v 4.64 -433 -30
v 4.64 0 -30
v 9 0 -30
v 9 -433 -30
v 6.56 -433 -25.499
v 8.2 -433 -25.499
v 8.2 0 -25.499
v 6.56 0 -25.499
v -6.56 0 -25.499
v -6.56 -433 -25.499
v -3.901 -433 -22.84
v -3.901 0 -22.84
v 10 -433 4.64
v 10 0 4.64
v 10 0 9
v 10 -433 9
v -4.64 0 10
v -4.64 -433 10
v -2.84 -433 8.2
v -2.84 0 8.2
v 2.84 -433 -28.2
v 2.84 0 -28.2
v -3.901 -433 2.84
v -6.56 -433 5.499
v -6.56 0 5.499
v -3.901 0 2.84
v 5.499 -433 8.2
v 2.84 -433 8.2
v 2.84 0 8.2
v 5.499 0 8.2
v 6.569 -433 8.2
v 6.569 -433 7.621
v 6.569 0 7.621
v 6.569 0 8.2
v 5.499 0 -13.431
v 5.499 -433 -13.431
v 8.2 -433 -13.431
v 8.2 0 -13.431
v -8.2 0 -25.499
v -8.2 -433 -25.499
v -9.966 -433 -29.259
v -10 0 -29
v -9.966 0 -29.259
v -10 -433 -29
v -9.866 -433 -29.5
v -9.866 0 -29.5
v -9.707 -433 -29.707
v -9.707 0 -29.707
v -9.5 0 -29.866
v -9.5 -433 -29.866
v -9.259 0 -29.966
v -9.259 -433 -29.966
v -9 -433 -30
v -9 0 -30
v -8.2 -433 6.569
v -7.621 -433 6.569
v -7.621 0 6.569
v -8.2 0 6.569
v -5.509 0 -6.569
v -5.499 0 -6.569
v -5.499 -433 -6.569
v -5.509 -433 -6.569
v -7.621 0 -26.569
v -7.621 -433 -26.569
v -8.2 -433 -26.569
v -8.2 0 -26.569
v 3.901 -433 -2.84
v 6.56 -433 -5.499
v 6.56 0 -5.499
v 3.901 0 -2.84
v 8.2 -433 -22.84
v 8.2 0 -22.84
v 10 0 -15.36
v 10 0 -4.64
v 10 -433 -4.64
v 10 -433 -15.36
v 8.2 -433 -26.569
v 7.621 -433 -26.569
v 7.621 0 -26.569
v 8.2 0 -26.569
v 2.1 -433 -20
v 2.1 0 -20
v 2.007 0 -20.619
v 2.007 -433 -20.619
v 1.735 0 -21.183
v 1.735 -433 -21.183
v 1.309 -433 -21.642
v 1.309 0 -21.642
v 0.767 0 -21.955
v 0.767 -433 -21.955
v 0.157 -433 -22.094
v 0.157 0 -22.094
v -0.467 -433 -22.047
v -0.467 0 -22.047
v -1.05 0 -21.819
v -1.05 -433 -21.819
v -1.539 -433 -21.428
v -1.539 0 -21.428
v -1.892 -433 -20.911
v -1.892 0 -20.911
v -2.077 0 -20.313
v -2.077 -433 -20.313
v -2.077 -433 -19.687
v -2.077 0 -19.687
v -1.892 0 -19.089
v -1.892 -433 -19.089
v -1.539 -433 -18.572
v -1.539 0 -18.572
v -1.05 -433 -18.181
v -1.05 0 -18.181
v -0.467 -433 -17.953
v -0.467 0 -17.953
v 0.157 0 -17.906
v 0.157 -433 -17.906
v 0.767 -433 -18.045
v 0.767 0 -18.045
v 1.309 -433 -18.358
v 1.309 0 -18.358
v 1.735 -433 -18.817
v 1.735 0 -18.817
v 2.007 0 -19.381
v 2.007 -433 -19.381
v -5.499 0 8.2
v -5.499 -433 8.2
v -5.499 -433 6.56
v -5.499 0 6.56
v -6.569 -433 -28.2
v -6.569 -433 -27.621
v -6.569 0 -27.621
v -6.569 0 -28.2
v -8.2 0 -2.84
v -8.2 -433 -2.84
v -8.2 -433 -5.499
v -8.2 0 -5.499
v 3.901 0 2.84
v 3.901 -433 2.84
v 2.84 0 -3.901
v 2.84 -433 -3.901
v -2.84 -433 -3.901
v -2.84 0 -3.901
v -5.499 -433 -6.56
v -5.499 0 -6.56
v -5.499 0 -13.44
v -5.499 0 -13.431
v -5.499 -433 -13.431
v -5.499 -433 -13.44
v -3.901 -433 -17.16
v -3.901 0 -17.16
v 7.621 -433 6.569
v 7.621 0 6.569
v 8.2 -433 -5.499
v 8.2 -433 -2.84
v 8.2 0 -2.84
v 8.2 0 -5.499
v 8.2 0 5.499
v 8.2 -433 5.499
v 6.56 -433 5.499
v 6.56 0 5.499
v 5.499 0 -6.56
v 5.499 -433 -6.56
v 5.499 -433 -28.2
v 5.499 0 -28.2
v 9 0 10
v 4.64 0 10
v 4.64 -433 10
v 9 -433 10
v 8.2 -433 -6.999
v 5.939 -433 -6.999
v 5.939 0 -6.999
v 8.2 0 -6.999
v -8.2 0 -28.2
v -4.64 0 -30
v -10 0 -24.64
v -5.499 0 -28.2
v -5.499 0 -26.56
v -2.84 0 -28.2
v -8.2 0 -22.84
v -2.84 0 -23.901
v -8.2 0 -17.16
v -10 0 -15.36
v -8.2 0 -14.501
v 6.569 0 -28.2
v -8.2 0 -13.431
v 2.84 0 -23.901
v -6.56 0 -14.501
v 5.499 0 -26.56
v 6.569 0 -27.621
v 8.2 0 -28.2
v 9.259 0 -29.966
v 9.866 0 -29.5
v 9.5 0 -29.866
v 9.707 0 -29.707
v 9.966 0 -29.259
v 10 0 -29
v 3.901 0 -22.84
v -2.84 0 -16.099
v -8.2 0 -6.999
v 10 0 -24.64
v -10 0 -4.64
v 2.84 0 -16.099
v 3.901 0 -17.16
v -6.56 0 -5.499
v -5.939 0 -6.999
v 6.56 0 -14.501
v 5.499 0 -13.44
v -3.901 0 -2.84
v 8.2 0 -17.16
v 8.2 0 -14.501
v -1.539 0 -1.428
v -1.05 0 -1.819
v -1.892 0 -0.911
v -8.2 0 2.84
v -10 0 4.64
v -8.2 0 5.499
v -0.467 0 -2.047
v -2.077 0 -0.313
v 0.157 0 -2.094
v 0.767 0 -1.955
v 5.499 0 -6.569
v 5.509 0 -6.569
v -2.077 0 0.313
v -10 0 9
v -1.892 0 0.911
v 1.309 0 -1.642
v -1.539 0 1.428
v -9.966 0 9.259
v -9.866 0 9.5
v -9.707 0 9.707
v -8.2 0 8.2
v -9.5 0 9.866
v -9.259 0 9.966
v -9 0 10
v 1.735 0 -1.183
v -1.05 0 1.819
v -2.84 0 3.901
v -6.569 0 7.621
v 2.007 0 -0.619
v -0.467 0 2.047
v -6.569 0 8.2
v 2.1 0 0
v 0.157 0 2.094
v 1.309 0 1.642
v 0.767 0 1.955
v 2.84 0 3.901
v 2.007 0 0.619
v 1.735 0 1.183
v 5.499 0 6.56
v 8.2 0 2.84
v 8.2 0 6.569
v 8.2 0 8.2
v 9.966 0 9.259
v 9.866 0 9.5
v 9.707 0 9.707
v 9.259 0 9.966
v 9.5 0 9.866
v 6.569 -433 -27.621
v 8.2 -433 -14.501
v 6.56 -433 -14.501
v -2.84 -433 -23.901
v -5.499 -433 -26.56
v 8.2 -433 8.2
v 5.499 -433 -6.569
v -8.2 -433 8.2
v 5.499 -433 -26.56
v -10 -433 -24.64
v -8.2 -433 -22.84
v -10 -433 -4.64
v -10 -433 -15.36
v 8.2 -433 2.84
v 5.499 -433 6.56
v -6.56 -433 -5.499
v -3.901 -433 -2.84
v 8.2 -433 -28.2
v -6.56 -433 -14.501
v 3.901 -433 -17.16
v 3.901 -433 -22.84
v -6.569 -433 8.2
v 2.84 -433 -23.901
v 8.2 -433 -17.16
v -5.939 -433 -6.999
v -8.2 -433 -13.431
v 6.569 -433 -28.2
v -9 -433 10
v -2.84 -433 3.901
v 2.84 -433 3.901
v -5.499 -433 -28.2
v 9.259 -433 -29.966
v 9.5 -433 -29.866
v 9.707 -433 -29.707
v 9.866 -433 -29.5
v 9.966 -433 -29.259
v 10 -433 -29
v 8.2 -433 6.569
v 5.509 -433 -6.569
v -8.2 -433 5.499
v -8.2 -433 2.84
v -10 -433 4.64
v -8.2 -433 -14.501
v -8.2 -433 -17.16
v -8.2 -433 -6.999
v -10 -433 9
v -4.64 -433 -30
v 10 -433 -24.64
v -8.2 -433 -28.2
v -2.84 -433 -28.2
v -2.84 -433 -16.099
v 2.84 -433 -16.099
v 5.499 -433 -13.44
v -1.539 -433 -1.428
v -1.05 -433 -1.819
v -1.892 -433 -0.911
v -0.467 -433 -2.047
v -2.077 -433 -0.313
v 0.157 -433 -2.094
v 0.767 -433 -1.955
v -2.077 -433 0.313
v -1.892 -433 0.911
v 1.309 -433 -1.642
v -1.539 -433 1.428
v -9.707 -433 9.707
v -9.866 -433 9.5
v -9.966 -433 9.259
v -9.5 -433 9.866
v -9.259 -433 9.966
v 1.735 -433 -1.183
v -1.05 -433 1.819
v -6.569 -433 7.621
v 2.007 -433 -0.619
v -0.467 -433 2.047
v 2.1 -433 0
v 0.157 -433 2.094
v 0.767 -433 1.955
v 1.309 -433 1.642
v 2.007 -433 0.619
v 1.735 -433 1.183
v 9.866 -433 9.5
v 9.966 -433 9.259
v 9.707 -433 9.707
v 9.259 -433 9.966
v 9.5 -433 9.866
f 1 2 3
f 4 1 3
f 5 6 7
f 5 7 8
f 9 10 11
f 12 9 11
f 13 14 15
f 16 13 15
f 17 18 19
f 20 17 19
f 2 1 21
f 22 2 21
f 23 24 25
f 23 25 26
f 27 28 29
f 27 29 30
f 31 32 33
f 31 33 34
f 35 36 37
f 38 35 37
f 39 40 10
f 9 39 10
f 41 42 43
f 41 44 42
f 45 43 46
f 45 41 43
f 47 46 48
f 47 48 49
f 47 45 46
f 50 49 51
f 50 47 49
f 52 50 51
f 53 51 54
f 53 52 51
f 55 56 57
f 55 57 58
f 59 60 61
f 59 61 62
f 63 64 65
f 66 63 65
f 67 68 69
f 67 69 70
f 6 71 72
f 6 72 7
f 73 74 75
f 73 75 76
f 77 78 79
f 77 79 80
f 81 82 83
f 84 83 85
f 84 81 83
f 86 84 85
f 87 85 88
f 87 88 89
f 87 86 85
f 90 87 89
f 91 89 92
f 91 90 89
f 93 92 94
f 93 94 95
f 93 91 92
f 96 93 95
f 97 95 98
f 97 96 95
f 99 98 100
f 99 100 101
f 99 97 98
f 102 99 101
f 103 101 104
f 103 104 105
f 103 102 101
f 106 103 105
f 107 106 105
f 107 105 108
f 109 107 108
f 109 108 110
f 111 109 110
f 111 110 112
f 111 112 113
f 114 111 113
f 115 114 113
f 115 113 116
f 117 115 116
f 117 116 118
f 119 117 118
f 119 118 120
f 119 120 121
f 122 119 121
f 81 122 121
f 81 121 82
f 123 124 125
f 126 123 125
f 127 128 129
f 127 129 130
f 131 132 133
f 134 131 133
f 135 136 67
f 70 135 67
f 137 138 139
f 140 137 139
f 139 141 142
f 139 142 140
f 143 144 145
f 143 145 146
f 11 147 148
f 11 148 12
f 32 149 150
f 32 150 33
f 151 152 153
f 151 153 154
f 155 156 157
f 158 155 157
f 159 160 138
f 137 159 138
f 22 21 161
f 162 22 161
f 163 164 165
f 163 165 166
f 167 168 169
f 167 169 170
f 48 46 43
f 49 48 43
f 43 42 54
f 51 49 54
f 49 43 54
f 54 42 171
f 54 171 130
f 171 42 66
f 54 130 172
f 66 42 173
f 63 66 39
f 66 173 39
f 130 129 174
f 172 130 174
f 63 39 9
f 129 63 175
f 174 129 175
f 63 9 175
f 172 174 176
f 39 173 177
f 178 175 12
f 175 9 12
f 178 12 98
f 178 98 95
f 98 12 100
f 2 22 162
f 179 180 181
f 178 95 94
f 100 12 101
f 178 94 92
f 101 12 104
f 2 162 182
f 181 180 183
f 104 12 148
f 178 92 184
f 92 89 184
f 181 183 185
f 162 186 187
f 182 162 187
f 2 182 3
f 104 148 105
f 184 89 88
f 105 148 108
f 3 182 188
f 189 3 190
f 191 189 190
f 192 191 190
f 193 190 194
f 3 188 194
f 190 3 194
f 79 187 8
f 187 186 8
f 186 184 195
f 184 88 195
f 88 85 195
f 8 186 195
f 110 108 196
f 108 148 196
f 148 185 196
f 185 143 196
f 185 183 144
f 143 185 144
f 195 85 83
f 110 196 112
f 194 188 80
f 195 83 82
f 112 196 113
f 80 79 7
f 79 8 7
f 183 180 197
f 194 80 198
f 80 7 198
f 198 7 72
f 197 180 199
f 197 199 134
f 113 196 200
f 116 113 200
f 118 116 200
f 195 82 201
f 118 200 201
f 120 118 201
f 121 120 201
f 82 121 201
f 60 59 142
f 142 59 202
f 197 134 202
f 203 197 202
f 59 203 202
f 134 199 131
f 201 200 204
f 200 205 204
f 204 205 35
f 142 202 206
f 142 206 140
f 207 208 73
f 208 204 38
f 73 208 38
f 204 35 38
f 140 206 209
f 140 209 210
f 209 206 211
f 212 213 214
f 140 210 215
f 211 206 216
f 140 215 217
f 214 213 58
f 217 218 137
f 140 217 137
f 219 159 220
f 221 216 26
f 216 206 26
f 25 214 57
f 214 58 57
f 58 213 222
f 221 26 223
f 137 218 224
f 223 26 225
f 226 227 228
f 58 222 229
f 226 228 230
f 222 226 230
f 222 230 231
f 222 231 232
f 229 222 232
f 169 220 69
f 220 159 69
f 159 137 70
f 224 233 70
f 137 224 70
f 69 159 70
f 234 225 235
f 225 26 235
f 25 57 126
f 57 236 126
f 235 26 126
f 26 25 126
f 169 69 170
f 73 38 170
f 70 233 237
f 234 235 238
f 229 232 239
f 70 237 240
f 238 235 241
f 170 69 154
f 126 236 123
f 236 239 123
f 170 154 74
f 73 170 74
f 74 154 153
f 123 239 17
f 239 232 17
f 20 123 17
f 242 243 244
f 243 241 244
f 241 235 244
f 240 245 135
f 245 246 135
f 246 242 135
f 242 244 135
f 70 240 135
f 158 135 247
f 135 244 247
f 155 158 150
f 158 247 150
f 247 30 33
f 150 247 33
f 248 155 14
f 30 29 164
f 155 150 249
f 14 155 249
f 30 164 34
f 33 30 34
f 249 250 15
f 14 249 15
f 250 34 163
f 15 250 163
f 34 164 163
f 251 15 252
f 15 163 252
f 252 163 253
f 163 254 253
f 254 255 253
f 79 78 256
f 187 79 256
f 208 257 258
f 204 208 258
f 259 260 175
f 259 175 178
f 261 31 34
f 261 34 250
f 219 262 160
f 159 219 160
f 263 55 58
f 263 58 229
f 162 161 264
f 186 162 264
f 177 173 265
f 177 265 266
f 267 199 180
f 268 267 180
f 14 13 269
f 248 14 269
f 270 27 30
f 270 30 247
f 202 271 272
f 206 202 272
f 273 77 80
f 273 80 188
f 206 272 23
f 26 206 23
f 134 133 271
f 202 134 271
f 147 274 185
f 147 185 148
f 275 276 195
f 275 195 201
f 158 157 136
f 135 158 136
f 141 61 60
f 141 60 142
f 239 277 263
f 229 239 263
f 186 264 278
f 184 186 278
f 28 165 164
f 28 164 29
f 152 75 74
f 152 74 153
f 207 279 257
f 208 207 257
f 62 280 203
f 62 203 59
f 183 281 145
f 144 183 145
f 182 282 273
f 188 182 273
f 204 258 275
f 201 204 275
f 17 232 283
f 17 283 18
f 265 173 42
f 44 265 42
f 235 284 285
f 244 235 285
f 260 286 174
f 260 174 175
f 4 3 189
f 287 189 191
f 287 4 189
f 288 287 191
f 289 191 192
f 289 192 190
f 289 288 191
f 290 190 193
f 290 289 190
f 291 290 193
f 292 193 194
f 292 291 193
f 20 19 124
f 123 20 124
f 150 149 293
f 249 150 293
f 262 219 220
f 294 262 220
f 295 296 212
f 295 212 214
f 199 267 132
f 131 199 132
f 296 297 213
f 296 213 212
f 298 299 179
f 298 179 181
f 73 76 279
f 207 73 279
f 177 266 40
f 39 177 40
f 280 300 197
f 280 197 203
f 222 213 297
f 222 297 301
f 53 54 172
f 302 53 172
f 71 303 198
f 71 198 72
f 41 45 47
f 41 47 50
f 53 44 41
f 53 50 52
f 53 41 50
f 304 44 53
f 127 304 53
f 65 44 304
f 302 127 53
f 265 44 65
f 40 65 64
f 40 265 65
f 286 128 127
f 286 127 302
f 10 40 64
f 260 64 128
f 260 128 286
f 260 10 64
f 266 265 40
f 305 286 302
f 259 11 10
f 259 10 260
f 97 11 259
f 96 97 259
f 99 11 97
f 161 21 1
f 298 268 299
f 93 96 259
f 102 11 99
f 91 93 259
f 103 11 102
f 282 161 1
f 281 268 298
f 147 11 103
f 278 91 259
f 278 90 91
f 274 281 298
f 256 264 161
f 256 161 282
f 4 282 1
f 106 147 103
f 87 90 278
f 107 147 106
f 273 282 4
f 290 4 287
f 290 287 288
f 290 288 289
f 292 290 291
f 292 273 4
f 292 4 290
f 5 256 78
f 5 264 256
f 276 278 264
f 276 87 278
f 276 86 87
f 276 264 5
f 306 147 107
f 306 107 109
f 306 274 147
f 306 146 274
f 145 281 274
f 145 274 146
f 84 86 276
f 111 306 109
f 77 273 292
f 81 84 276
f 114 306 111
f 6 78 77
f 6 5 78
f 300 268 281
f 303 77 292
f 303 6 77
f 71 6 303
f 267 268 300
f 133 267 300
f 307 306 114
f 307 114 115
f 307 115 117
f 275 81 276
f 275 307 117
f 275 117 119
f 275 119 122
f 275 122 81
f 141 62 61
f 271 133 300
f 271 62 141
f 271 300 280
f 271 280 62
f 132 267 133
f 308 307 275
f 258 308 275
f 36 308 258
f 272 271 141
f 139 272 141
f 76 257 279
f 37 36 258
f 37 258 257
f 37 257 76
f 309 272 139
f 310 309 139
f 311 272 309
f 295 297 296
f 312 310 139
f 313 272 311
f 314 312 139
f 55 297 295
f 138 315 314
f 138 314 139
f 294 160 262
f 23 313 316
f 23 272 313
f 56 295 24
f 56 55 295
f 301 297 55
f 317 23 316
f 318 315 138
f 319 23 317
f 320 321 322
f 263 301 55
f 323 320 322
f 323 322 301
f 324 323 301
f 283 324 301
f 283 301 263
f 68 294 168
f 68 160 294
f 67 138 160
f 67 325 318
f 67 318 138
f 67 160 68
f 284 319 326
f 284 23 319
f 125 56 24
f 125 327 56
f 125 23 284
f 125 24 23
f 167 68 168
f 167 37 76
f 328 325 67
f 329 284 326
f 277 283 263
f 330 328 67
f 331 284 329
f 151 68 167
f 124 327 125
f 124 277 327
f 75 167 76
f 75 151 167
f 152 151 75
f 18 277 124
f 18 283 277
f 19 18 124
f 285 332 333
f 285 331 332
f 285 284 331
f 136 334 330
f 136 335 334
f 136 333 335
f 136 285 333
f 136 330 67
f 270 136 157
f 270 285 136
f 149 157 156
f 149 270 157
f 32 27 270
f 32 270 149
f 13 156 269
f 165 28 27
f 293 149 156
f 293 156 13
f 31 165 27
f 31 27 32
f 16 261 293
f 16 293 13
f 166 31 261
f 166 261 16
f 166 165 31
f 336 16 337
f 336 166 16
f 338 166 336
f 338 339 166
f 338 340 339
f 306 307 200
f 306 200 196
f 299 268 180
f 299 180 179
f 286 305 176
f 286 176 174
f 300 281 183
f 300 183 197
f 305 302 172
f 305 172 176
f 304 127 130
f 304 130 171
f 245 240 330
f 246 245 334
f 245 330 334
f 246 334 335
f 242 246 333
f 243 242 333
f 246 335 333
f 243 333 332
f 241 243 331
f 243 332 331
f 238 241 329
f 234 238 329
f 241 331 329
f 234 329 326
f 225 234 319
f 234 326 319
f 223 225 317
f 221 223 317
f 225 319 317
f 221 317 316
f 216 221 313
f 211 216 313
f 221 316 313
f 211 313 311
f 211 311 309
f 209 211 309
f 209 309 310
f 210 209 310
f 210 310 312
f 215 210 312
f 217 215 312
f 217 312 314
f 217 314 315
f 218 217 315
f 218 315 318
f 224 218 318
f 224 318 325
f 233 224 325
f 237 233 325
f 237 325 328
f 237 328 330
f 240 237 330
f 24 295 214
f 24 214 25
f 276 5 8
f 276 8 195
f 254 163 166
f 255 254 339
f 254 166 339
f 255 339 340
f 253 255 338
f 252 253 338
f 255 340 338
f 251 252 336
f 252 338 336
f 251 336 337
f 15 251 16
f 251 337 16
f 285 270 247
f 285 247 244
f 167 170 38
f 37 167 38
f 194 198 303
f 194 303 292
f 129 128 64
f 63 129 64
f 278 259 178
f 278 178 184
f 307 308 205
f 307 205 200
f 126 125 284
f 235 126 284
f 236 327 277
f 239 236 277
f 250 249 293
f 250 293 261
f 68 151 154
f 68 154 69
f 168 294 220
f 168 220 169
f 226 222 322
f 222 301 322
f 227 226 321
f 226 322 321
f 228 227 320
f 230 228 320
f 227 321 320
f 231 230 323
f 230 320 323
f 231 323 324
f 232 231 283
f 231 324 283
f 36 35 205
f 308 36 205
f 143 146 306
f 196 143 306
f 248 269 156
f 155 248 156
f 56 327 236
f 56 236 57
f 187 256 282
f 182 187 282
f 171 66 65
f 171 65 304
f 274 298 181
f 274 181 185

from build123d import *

# Parameters (mm, degrees)
F0_W             = 20
F0_H             = 20
F1_DEPTH         = 433
F2_R             = 2.1
F3_DEPTH         = 433.001
F4_R             = 1
F6_DEPTH         = 433.001
F6_COPIES3_COUNT = 2
F6_COPIES3_ANGLE = 90
F6_COPIES4_COUNT = 2
F6_COPIES4_ANGLE = 270
F6_COPIES6_COUNT = 2
F9_W             = 16.4
F9_H             = 6.8613203436
F10_DEPTH        = 433.001
F12_DEPTH        = 433


# Not quite as in the source:
# - a pattern or mirror of a feature is missing from the dataset's text; its kind, count and spacing are read off the source's solid


with BuildPart() as f1:
    # F0 (on Front) → F1 (new body)
    with BuildSketch(Plane.XZ):
        Rectangle(F0_W, F0_H)
    extrude(amount=F1_DEPTH)

    # F2 (on face) → F3 (cut, through all)
    with BuildSketch(Plane.XZ.offset(433)):
        Circle(F2_R)
    extrude(amount=-F3_DEPTH, mode=Mode.SUBTRACT)

    # F4
    f4_edges = [f1.edges().sort_by_distance(p)[0] for p in [
        (-10, -216.5, 10),
        (10, -216.5, 10),
    ]]
    fillet(f4_edges, radius=F4_R)

    # F5 (on face) → F6 (cut, through all)
    with BuildSketch(Plane.XZ.offset(433)):
        Polygon((0, 3.9006601718), (0, 10), (-2.84, 10), (-4.64, 10), (-2.84, 8.2), (-5.4993398282, 8.2), (-5.4993398282, 6.56), (-2.84, 3.9006601718), align=None)
        Polygon((-6.5693398282, 8.2), (-8.2, 8.2), (-7.0953059148, 7.0953059148), (-6.5693398282, 7.6212720014), align=None)
    f6 = extrude(amount=-F6_DEPTH, mode=Mode.SUBTRACT)

    # F6_copies: F6 across plane
    add(f6.mirror(Plane(origin=(0, 0, 0), x_dir=(-0.7071067812, 0, -0.7071067812), z_dir=(0.7071067812, 0, -0.7071067812))), mode=Mode.SUBTRACT)

    # F6_copies1: F6 across plane
    add(f6.mirror(Plane(origin=(0, 0, 0), x_dir=(0.7071067812, 0, -0.7071067812), z_dir=(-0.7071067812, 0, -0.7071067812))), mode=Mode.SUBTRACT)

    # F6_copies2: F6 across plane
    add(f6.mirror(Plane(origin=(0, 0, 0), x_dir=(0, 0, 1), z_dir=(1, 0, 0))), mode=Mode.SUBTRACT)

    # F6_copies3: F6 ×2 about axis
    f6_copies3_axis = Axis((0, 0, 0), (0, 1, 0))
    for i in range(1, F6_COPIES3_COUNT):
        add(f6.rotate(f6_copies3_axis, i * F6_COPIES3_ANGLE / (F6_COPIES3_COUNT - 1)), mode=Mode.SUBTRACT)

    # F6_copies4: F6 ×2 about axis
    f6_copies4_axis = Axis((0, 0, 0), (0, 1, 0))
    for i in range(1, F6_COPIES4_COUNT):
        add(f6.rotate(f6_copies4_axis, i * F6_COPIES4_ANGLE / (F6_COPIES4_COUNT - 1)), mode=Mode.SUBTRACT)

    # F6_copies5: F6 across plane
    add(f6.mirror(Plane(origin=(0, 0, 0), x_dir=(-1, 0, 0), z_dir=(0, 0, -1))), mode=Mode.SUBTRACT)

    # F6_copies6: F6 ×2 about axis
    f6_copies6_axis = Axis((0, 0, 0), (0, 1, 0))
    for i in range(1, F6_COPIES6_COUNT):
        add(f6.rotate(f6_copies6_axis, i * 360 / F6_COPIES6_COUNT), mode=Mode.SUBTRACT)

    # F8: F1 across face


with BuildPart() as f1_1:
    add(f1.part)
    add(f1.part.mirror(Plane(origin=(-7.32, -216.5, -10), x_dir=(1, 0, 0), z_dir=(0, 0, -1))))

    # F9 (on face) → F10 (cut, through all)
    with BuildSketch(Plane.XZ.offset(433)):
        with Locations((0, -10)):
            Rectangle(F9_W, F9_H)
    extrude(amount=-F10_DEPTH, mode=Mode.SUBTRACT)

    # F11 (on face) → F12 (join, through all)
    with BuildSketch(Plane.XZ.offset(433)):
        with BuildLine():
            ThreePointArc((-9, -10), (-9.7071067812, -9.7071067812), (-10, -9))
            Line((-10, -9), (-10, -11))
            ThreePointArc((-10, -11), (-9.7071067812, -10.2928932188), (-9, -10))
        make_face()
        with BuildLine():
            ThreePointArc((10, -9), (9.7071067812, -9.7071067812), (9, -10))
            ThreePointArc((9, -10), (9.7071067812, -10.2928932188), (10, -11))
            Line((10, -11), (10, -9))
        make_face()
        Polygon((5.9386796564, -6.9993398282), (8.2, -6.9993398282), (8.2, -6.5693398282), (5.5086796564, -6.5693398282), align=None)
        Polygon((-8.2, -6.5693398282), (-8.2, -6.9993398282), (-5.9386796564, -6.9993398282), (-5.5086796564, -6.5693398282), align=None)
    extrude(amount=-F12_DEPTH)


solid = f1_1.part
